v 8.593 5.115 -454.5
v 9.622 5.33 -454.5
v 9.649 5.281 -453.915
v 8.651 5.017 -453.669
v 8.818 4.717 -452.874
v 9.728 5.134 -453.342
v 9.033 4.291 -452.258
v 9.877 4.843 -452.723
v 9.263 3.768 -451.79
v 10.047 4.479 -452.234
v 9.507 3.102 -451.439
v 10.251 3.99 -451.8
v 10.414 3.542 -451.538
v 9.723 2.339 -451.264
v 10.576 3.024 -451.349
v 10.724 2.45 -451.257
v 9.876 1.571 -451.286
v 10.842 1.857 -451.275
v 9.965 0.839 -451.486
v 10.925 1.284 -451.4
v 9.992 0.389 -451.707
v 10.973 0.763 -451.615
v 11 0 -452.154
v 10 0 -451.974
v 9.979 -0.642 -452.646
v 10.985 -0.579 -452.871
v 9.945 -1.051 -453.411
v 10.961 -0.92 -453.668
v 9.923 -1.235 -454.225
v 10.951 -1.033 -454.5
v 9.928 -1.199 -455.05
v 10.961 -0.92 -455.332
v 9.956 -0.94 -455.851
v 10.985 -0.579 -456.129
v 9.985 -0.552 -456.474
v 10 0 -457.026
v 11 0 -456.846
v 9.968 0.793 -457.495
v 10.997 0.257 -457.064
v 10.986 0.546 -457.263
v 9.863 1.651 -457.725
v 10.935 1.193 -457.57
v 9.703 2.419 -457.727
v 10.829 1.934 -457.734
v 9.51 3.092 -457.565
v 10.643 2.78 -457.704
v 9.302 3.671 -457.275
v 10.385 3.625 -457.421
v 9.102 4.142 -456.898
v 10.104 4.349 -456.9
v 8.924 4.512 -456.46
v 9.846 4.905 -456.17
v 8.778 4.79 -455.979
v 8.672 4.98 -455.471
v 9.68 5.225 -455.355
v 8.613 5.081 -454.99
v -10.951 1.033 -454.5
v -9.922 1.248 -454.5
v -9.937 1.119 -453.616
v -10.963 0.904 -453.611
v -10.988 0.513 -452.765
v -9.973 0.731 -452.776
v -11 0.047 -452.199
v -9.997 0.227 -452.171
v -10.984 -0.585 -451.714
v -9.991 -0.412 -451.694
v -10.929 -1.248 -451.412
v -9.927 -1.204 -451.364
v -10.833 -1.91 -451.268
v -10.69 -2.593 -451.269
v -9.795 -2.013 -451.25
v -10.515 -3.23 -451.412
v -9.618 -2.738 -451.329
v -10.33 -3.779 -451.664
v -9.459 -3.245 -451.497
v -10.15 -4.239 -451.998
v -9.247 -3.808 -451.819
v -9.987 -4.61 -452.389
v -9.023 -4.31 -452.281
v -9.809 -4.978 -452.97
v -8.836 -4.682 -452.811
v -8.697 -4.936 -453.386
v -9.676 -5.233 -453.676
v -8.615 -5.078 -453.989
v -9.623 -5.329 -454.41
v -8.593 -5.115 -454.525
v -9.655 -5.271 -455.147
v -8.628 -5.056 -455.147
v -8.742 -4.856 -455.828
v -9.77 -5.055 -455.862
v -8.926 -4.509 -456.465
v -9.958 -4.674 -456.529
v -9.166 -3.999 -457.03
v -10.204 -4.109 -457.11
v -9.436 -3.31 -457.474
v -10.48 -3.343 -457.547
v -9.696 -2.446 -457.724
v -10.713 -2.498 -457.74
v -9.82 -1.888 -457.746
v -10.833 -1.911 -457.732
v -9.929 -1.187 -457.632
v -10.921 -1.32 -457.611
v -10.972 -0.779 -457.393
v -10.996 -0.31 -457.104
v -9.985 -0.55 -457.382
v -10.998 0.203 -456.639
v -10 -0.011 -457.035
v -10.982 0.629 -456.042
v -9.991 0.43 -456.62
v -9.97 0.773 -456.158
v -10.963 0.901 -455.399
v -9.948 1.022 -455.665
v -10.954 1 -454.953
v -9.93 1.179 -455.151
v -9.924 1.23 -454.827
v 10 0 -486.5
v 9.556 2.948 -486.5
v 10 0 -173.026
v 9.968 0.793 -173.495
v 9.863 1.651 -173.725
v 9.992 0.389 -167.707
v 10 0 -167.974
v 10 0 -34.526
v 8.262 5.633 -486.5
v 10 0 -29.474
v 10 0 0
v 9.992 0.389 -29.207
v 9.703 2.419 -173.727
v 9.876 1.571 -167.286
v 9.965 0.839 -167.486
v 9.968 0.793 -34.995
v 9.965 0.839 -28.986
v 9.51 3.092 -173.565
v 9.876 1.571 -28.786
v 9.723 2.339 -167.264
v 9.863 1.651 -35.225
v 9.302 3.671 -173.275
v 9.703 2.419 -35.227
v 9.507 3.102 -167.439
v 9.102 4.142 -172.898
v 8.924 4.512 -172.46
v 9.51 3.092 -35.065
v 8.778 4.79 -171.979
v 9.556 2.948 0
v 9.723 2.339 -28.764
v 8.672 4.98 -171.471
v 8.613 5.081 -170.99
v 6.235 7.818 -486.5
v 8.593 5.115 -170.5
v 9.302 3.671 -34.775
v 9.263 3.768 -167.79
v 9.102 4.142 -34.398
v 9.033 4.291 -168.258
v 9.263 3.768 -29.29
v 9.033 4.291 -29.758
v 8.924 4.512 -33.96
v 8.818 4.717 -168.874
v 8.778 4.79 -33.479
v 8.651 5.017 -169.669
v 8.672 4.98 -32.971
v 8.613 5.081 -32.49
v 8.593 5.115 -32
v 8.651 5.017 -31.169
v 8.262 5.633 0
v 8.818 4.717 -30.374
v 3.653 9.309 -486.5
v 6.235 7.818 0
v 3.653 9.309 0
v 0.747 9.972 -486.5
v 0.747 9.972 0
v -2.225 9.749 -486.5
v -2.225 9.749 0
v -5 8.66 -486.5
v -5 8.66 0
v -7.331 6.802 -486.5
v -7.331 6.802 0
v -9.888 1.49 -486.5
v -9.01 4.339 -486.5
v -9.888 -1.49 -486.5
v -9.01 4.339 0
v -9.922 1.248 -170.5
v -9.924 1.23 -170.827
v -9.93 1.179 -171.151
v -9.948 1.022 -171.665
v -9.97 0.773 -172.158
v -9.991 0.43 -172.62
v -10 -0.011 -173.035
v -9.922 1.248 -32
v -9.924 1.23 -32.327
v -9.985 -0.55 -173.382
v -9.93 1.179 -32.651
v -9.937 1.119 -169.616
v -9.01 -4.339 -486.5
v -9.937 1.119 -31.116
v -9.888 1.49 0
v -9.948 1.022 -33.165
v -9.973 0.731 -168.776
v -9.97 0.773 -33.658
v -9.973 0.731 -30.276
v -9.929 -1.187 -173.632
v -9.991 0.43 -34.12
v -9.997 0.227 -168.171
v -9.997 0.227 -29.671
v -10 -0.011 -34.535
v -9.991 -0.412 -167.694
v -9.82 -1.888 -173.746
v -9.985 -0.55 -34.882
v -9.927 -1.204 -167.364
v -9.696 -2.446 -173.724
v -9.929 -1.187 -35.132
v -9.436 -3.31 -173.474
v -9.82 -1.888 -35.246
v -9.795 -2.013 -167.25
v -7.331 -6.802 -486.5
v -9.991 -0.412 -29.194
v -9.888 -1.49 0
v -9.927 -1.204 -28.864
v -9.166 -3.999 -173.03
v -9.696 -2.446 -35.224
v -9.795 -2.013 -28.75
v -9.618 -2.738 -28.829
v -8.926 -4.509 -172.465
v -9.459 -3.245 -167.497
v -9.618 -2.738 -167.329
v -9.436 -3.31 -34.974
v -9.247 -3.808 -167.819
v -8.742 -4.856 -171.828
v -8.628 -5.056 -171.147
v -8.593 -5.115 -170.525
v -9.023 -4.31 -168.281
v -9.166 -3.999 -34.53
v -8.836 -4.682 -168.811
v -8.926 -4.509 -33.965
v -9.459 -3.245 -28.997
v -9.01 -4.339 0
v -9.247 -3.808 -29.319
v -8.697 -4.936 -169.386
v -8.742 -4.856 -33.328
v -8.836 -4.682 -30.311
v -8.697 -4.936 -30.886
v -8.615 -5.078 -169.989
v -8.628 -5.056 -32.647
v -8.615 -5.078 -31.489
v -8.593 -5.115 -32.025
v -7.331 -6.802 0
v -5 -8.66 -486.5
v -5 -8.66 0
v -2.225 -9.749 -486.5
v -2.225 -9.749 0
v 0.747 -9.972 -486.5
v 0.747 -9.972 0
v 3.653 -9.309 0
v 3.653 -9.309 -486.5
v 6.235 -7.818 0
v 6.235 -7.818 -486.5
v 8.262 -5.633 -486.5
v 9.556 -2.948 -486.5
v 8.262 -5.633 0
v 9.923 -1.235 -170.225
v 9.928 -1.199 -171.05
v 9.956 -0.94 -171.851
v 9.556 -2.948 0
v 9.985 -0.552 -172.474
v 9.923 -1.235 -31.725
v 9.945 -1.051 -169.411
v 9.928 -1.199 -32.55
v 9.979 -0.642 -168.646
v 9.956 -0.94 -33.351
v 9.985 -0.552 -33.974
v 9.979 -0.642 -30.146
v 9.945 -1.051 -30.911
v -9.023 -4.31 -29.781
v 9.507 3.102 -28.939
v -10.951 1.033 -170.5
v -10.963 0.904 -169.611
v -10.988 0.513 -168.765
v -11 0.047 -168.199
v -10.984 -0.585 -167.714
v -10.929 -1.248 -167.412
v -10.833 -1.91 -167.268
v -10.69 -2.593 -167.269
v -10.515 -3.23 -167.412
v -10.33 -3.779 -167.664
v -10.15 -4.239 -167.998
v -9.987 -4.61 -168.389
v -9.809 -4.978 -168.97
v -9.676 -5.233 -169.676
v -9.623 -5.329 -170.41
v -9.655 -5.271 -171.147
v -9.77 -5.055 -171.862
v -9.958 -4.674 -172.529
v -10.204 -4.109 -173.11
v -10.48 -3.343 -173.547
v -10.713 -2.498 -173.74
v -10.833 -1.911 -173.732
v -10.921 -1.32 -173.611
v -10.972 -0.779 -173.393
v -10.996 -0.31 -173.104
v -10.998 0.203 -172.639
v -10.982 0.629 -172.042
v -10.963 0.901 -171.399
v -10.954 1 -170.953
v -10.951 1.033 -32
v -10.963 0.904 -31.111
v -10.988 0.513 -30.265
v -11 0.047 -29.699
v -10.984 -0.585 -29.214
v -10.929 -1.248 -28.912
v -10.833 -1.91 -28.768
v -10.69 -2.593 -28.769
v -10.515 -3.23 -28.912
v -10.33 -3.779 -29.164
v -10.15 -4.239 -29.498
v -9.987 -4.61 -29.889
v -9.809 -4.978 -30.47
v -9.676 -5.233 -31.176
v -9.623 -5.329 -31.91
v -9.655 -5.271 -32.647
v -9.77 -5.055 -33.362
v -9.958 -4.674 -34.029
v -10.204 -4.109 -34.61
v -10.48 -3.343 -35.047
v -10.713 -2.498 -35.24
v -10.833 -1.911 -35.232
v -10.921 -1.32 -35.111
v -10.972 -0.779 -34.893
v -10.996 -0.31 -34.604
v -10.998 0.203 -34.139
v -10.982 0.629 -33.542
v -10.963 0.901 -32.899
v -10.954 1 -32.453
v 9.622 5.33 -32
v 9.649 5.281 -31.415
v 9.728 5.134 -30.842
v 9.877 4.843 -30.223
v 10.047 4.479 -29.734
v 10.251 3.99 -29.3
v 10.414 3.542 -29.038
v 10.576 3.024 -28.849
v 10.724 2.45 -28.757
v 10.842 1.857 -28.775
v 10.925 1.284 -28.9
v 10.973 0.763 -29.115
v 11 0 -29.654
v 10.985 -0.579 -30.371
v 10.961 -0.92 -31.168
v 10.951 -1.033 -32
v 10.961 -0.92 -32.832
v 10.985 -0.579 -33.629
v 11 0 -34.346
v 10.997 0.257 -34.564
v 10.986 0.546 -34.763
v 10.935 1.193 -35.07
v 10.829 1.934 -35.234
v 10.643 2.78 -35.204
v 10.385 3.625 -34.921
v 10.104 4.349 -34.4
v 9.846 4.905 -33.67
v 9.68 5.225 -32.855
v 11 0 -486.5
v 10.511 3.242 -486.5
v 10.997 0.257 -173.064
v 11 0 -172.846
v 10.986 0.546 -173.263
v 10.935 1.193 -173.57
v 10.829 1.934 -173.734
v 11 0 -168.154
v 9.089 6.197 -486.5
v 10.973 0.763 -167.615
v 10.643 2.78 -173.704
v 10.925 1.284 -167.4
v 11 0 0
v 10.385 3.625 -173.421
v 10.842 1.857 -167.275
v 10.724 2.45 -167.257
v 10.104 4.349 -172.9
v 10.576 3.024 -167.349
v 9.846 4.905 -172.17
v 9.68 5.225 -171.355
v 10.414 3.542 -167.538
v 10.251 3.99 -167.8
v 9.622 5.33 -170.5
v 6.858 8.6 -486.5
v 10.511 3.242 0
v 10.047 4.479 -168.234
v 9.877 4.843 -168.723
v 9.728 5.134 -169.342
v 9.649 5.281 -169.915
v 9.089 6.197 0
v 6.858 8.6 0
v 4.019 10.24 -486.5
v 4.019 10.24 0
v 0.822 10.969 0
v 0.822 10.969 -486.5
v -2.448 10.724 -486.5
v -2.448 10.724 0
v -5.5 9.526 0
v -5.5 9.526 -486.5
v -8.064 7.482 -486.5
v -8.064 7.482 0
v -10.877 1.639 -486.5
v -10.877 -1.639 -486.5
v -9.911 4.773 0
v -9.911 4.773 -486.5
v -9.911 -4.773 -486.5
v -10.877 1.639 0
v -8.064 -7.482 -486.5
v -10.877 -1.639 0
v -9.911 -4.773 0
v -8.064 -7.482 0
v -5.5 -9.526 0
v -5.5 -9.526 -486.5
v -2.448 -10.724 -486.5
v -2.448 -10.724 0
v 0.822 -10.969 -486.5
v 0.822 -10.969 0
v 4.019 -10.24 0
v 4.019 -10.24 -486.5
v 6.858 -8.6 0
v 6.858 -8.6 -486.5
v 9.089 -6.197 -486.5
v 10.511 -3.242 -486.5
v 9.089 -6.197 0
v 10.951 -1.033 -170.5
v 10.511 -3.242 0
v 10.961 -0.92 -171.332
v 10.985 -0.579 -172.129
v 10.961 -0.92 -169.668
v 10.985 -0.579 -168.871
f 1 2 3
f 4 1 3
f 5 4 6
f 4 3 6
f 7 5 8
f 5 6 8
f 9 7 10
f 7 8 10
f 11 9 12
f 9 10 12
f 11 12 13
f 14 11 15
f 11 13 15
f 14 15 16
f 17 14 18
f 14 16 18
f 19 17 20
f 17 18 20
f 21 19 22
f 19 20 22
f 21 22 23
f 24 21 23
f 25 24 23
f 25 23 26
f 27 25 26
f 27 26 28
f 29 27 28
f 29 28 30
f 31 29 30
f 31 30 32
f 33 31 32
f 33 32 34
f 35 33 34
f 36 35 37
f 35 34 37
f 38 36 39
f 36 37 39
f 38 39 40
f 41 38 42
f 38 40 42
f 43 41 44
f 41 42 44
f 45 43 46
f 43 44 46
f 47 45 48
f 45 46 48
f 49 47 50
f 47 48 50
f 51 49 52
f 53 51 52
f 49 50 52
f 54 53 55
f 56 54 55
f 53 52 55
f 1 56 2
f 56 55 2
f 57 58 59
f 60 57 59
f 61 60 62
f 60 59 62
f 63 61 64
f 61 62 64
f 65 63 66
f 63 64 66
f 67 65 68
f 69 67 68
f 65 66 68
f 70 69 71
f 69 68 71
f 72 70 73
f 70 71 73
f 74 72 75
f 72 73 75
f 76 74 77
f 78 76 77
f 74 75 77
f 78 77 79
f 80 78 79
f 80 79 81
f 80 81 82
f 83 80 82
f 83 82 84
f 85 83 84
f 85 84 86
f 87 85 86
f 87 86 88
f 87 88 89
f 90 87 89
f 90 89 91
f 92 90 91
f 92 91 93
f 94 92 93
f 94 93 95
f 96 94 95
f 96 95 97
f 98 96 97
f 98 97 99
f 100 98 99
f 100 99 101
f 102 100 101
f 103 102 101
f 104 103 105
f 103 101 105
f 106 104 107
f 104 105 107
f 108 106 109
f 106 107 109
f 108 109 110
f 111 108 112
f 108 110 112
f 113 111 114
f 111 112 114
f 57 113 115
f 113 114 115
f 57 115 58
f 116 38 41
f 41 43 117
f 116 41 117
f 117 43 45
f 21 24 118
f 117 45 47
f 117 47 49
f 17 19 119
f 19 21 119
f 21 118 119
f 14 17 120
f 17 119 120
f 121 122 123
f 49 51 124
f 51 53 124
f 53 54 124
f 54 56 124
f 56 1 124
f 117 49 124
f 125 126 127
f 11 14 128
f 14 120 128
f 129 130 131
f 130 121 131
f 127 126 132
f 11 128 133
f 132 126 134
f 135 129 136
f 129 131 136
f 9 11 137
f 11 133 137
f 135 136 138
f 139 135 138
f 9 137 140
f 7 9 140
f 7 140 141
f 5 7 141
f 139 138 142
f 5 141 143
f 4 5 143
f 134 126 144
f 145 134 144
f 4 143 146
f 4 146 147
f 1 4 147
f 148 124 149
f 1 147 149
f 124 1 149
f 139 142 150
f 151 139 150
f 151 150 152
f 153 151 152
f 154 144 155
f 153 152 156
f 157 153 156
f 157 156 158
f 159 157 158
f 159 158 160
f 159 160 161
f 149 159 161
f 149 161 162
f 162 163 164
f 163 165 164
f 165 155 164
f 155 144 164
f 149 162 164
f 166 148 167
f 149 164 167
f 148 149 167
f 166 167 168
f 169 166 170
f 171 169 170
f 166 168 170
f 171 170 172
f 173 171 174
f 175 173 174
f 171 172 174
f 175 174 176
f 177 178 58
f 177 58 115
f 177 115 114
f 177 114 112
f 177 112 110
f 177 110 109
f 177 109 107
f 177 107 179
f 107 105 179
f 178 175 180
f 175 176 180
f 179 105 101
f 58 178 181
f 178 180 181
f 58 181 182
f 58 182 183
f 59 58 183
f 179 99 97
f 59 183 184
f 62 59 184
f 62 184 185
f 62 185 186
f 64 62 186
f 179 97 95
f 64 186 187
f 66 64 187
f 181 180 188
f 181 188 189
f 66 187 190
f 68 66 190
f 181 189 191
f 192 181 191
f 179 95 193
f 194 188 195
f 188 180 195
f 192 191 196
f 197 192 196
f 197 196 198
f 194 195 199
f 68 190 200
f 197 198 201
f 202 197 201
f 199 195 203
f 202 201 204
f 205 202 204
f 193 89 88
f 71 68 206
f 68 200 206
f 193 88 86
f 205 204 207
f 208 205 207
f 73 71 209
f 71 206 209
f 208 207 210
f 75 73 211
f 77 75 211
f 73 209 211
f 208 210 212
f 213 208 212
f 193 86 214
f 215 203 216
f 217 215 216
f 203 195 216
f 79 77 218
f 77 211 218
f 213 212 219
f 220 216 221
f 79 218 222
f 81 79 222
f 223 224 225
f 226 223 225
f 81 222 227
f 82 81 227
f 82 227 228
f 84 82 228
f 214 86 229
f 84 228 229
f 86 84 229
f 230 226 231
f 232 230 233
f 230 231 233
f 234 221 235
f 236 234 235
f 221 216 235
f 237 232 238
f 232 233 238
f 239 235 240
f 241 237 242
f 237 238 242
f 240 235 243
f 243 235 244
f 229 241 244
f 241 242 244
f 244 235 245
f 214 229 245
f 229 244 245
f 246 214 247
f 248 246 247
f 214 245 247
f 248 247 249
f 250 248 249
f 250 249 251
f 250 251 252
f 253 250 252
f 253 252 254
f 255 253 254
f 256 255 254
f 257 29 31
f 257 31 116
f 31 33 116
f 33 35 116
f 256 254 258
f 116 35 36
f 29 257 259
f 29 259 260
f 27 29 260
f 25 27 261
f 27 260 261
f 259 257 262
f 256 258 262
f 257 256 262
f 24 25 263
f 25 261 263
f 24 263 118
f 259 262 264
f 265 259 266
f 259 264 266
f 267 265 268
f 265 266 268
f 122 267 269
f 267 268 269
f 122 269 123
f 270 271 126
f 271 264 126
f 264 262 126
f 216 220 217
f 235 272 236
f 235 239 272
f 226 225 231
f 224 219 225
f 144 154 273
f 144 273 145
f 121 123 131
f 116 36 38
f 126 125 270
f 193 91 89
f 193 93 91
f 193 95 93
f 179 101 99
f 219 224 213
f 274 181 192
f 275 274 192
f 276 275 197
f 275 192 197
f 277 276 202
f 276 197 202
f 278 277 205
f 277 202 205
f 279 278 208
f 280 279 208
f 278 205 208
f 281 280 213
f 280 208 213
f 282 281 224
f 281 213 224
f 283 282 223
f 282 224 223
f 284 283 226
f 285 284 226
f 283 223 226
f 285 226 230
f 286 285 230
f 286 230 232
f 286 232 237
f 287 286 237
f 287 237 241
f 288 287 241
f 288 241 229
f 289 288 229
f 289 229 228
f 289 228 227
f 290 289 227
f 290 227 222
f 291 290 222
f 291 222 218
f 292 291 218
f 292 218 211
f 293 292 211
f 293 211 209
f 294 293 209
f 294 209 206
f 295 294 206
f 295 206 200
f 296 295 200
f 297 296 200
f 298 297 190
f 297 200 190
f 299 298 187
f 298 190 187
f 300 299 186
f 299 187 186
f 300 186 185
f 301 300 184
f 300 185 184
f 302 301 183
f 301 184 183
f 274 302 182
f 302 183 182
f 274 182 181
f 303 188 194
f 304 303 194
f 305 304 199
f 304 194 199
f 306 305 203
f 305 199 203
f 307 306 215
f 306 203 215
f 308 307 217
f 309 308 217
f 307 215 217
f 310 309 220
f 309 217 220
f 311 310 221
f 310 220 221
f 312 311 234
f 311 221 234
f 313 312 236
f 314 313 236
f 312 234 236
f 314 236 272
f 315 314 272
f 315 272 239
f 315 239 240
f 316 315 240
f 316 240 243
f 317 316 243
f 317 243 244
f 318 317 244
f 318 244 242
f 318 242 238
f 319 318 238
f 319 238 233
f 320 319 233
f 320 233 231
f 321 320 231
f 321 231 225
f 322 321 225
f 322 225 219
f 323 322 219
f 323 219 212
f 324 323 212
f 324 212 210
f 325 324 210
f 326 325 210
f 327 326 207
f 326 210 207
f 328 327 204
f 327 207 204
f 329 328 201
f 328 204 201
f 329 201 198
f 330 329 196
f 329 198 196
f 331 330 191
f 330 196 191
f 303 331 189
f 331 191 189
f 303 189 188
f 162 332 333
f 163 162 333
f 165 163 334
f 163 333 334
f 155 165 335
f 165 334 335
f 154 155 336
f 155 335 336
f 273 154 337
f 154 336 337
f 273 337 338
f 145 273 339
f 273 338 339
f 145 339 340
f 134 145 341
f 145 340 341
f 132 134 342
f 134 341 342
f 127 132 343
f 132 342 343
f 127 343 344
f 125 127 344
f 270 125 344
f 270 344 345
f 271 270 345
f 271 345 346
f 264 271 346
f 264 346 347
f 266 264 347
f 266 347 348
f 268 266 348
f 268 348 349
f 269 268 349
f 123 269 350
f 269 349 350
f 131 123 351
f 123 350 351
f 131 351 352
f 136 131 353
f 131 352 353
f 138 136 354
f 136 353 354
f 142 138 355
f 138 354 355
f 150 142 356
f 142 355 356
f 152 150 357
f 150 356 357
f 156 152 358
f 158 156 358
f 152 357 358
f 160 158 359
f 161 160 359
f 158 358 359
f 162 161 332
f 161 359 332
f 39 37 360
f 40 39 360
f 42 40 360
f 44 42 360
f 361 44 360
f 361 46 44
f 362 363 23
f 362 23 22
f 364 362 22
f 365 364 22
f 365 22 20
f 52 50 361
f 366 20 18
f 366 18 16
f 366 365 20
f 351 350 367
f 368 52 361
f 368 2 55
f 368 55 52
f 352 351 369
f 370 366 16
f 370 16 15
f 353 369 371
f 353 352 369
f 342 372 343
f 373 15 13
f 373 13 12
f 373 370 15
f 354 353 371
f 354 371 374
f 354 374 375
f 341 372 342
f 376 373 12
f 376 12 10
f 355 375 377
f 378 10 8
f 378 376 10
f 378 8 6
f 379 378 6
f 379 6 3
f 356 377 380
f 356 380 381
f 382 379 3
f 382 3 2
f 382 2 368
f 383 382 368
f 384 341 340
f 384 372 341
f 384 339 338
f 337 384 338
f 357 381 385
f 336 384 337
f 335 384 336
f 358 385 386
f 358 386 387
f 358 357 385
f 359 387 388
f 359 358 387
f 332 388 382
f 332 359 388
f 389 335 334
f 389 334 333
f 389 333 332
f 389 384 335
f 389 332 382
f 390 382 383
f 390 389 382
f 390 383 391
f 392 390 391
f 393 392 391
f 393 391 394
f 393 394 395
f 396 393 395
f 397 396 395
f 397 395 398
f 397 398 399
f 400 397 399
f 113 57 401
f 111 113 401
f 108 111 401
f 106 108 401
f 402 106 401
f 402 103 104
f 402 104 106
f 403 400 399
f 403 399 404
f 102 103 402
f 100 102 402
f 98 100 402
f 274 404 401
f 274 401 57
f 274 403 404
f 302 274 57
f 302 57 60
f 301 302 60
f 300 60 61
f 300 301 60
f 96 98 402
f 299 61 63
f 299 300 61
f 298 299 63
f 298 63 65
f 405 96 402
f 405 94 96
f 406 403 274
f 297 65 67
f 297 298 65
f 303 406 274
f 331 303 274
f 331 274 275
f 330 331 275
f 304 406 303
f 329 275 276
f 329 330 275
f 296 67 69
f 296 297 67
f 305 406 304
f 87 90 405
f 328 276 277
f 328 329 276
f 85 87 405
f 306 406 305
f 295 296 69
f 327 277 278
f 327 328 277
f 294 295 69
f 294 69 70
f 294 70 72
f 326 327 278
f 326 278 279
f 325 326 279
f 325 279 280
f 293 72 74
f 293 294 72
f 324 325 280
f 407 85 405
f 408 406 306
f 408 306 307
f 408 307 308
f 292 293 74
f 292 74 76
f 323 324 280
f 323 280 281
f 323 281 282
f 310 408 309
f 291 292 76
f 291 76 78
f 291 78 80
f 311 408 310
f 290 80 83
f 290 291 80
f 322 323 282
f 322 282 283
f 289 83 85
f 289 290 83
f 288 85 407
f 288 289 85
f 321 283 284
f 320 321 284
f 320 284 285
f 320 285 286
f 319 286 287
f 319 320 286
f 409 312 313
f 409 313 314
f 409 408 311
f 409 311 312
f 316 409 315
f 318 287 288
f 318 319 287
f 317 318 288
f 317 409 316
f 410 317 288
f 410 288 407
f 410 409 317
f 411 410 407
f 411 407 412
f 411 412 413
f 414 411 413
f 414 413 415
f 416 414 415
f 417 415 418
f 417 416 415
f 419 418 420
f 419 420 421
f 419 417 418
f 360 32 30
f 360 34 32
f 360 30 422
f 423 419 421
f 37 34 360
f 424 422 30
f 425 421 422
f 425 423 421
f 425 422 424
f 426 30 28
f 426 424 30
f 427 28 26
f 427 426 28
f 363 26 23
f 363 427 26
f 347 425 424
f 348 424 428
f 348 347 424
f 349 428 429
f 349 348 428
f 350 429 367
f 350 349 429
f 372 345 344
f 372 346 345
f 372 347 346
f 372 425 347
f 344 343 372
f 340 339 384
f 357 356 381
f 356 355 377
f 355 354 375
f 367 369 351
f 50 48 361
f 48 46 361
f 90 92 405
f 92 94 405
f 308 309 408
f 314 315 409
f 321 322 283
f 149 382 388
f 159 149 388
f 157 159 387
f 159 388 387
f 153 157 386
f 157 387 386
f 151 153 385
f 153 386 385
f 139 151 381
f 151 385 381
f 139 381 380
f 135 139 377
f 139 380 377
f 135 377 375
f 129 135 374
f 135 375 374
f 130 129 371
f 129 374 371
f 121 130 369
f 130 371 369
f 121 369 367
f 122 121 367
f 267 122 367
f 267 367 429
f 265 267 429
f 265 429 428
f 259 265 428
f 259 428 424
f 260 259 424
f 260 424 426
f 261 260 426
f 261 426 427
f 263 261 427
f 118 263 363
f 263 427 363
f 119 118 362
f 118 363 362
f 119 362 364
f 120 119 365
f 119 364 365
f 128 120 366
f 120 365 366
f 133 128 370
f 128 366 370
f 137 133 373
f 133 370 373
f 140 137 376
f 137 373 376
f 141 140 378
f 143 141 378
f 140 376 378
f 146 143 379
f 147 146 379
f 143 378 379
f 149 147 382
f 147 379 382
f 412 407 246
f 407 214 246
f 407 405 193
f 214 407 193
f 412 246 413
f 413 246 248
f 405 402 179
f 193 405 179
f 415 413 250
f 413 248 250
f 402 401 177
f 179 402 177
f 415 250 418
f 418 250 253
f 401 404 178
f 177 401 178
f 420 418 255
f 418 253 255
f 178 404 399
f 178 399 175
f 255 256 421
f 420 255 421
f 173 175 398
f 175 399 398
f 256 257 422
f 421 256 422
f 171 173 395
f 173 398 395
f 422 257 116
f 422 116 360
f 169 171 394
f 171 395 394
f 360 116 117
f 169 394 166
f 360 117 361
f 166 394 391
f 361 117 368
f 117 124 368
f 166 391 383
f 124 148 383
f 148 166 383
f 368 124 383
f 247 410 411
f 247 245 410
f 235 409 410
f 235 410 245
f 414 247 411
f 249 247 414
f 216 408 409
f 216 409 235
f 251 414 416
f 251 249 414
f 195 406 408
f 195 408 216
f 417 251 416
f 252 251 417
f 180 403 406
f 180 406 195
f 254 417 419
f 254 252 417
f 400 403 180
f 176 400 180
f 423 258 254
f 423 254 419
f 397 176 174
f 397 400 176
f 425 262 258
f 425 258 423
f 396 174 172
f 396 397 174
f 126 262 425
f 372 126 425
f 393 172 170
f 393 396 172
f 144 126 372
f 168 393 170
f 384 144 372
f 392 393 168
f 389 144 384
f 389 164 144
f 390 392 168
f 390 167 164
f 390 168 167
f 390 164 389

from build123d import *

# Parameters (mm, degrees)
SKETCH1_R           = 11
SKETCH1_R_2         = 10
BOSS_EXTRUDE1_DEPTH = 486.5
SKETCH3_R           = 3.25
CUT_EXTRUDE1_DEPTH  = 488.166931009


with BuildPart() as part:
    # Sketch1 → Boss-Extrude1 (new body)
    with BuildSketch(Plane.XY):
        Circle(SKETCH1_R)
        Circle(SKETCH1_R_2, mode=Mode.SUBTRACT)
    extrude(amount=-BOSS_EXTRUDE1_DEPTH)

    # Sketch3 → Cut-Extrude1 (cut, through all)
    with BuildSketch(Plane(origin=(10.767604694, 2.249152987, 0), x_dir=(0, 0, -1), z_dir=(0.978873153981486, 0.20446845334754707, 0))):
        with Locations(Location((32, 0, 0), (0, 0, 90))):
            Circle(SKETCH3_R)
        with Locations(Location((170.5, 0, 0), (0, 0, 90))):
            Circle(SKETCH3_R)
        with Locations(Location((454.5, 0, 0), (0, 0, 90))):
            Circle(SKETCH3_R)
    extrude(amount=-CUT_EXTRUDE1_DEPTH, mode=Mode.SUBTRACT)


solid = part.part
